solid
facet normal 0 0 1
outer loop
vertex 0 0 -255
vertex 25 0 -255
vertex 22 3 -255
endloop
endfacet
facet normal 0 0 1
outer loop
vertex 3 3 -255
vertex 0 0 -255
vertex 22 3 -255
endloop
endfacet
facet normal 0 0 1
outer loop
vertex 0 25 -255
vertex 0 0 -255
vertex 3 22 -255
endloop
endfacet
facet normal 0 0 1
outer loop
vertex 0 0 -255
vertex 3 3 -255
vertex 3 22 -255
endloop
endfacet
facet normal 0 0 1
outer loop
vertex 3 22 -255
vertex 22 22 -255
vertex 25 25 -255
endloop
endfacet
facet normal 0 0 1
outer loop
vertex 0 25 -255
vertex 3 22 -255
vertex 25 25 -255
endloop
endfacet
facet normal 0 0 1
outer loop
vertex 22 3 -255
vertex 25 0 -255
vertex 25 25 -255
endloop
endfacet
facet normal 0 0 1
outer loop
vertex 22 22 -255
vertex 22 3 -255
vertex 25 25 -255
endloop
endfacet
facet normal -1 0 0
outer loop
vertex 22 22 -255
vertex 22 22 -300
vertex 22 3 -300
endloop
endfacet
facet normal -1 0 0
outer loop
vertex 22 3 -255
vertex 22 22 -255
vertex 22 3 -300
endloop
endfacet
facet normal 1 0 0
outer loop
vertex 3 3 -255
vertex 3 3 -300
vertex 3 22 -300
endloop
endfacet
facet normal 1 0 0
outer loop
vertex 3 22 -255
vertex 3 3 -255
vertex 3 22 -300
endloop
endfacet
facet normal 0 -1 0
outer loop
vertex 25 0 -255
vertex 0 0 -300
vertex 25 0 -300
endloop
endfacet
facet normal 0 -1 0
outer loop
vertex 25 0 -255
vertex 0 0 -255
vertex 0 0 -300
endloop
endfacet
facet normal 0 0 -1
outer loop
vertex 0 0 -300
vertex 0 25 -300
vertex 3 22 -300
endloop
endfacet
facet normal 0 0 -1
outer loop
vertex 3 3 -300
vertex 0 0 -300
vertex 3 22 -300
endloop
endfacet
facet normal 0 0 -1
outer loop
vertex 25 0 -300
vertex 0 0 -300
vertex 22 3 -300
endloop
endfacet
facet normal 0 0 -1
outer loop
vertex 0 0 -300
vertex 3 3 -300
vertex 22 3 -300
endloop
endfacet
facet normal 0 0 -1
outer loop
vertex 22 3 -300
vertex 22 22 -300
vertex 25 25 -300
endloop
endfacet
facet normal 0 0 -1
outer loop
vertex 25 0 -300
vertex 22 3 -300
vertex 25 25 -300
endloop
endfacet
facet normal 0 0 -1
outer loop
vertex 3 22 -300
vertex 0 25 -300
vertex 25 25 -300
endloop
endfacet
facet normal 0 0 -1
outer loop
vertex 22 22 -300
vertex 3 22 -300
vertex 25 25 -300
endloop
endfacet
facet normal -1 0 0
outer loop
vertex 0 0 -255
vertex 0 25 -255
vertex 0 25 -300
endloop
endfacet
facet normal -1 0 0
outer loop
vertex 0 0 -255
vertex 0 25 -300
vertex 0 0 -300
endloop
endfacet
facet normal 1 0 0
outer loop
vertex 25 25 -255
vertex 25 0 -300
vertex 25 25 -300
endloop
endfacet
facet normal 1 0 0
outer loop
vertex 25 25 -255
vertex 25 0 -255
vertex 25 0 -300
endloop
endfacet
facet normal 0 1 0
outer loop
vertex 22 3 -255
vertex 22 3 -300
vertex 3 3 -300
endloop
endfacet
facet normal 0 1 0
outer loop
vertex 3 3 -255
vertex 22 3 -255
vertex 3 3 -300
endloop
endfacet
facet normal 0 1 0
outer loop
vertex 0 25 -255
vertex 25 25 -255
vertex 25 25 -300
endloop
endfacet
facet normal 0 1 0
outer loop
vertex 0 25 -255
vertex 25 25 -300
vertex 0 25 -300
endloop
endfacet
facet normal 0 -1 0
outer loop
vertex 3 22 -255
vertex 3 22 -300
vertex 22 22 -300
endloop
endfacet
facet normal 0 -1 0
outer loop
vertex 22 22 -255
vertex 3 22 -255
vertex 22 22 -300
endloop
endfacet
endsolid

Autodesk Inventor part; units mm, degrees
ref_plane "YZ Plane" through (0, 0, 0) normal (1, 0, 0) x (0, 1, 0)
ref_plane "XZ Plane" through (0, 0, 0) normal (0, 1, 0) x (-1, 0, 0)
ref_plane "XY Plane" through (0, 0, 0) normal (0, 0, 1) x (1, 0, 0)
sketch "Sketch1" plane through (0, 0, 0) normal (0, 0, 1) x (1, 0, 0)
  line L0 (0, 0) -> (25, 0)
  line L1 (25, 0) -> (25, 25)
  line L2 (25, 25) -> (0, 25)
  line L3 (0, 25) -> (0, 0)
  line L4 (3, 22) -> (22, 22)
  line L5 (22, 22) -> (22, 3)
  line L6 (22, 3) -> (3, 3)
  line L7 (3, 3) -> (3, 22)
  dimension "d0" = 25
  dimension "d1" = 25
  dimension "d2" = 3
extrude "Extrusion1" add sketch "Sketch1" against normal blind 300
sketch "Sketch2" plane through (25, 0, 0) normal (1, 0, 0) x (0, 0, -1)
  line L0 (0, 0) -> (0, 25) projected
  line L1 (0, 0) -> (300, 0) projected
  line L2 (300, 25) -> (300, 0) projected
  line L3 (0, 25) -> (300, 25) projected
  line L4 (0, 25) -> (300, 25) projected
  line L5 (48.3423, 25) -> (60, 0)
  line L6 (0, 0) -> (300, 0) projected
  line L7 (0, 0) -> (-11.6577, 25)
  line L8 (-11.6577, 25) -> (48.3423, 25)
  line L9 (255, 0) -> (230, 25)
  line L10 (255, 0) -> (300, 0)
  line L11 (0, 3) -> (300, 3) projected
  line L12 (275, 25) -> (230, 25)
  line L13 (255, 0) -> (255, 25)
  line L14 (242.5, 12.5) -> (255, 25)
  line L15 (255, 0) -> (255, 3)
  line L16 (0, 3) -> (300, 3) projected
  line L17 (252, 3) -> (255, 3)
  line L18 (252, 3) -> (255, 0)
  point P0 (58.6011, 3)
  point P1 (255, 3)
  point P2 (255, 3)
  dimension "d6" = 65
  dimension "d10" = 60
  dimension "d11" = 45
  dimension "d21" = 70
extrude "Extrusion2" cut sketch "Sketch2" against normal blind 300 contours L13 L11 L2 L1 | L13 L3 L2 L11 keep common part
properties part number "P601" material "Aluminum 6061"
